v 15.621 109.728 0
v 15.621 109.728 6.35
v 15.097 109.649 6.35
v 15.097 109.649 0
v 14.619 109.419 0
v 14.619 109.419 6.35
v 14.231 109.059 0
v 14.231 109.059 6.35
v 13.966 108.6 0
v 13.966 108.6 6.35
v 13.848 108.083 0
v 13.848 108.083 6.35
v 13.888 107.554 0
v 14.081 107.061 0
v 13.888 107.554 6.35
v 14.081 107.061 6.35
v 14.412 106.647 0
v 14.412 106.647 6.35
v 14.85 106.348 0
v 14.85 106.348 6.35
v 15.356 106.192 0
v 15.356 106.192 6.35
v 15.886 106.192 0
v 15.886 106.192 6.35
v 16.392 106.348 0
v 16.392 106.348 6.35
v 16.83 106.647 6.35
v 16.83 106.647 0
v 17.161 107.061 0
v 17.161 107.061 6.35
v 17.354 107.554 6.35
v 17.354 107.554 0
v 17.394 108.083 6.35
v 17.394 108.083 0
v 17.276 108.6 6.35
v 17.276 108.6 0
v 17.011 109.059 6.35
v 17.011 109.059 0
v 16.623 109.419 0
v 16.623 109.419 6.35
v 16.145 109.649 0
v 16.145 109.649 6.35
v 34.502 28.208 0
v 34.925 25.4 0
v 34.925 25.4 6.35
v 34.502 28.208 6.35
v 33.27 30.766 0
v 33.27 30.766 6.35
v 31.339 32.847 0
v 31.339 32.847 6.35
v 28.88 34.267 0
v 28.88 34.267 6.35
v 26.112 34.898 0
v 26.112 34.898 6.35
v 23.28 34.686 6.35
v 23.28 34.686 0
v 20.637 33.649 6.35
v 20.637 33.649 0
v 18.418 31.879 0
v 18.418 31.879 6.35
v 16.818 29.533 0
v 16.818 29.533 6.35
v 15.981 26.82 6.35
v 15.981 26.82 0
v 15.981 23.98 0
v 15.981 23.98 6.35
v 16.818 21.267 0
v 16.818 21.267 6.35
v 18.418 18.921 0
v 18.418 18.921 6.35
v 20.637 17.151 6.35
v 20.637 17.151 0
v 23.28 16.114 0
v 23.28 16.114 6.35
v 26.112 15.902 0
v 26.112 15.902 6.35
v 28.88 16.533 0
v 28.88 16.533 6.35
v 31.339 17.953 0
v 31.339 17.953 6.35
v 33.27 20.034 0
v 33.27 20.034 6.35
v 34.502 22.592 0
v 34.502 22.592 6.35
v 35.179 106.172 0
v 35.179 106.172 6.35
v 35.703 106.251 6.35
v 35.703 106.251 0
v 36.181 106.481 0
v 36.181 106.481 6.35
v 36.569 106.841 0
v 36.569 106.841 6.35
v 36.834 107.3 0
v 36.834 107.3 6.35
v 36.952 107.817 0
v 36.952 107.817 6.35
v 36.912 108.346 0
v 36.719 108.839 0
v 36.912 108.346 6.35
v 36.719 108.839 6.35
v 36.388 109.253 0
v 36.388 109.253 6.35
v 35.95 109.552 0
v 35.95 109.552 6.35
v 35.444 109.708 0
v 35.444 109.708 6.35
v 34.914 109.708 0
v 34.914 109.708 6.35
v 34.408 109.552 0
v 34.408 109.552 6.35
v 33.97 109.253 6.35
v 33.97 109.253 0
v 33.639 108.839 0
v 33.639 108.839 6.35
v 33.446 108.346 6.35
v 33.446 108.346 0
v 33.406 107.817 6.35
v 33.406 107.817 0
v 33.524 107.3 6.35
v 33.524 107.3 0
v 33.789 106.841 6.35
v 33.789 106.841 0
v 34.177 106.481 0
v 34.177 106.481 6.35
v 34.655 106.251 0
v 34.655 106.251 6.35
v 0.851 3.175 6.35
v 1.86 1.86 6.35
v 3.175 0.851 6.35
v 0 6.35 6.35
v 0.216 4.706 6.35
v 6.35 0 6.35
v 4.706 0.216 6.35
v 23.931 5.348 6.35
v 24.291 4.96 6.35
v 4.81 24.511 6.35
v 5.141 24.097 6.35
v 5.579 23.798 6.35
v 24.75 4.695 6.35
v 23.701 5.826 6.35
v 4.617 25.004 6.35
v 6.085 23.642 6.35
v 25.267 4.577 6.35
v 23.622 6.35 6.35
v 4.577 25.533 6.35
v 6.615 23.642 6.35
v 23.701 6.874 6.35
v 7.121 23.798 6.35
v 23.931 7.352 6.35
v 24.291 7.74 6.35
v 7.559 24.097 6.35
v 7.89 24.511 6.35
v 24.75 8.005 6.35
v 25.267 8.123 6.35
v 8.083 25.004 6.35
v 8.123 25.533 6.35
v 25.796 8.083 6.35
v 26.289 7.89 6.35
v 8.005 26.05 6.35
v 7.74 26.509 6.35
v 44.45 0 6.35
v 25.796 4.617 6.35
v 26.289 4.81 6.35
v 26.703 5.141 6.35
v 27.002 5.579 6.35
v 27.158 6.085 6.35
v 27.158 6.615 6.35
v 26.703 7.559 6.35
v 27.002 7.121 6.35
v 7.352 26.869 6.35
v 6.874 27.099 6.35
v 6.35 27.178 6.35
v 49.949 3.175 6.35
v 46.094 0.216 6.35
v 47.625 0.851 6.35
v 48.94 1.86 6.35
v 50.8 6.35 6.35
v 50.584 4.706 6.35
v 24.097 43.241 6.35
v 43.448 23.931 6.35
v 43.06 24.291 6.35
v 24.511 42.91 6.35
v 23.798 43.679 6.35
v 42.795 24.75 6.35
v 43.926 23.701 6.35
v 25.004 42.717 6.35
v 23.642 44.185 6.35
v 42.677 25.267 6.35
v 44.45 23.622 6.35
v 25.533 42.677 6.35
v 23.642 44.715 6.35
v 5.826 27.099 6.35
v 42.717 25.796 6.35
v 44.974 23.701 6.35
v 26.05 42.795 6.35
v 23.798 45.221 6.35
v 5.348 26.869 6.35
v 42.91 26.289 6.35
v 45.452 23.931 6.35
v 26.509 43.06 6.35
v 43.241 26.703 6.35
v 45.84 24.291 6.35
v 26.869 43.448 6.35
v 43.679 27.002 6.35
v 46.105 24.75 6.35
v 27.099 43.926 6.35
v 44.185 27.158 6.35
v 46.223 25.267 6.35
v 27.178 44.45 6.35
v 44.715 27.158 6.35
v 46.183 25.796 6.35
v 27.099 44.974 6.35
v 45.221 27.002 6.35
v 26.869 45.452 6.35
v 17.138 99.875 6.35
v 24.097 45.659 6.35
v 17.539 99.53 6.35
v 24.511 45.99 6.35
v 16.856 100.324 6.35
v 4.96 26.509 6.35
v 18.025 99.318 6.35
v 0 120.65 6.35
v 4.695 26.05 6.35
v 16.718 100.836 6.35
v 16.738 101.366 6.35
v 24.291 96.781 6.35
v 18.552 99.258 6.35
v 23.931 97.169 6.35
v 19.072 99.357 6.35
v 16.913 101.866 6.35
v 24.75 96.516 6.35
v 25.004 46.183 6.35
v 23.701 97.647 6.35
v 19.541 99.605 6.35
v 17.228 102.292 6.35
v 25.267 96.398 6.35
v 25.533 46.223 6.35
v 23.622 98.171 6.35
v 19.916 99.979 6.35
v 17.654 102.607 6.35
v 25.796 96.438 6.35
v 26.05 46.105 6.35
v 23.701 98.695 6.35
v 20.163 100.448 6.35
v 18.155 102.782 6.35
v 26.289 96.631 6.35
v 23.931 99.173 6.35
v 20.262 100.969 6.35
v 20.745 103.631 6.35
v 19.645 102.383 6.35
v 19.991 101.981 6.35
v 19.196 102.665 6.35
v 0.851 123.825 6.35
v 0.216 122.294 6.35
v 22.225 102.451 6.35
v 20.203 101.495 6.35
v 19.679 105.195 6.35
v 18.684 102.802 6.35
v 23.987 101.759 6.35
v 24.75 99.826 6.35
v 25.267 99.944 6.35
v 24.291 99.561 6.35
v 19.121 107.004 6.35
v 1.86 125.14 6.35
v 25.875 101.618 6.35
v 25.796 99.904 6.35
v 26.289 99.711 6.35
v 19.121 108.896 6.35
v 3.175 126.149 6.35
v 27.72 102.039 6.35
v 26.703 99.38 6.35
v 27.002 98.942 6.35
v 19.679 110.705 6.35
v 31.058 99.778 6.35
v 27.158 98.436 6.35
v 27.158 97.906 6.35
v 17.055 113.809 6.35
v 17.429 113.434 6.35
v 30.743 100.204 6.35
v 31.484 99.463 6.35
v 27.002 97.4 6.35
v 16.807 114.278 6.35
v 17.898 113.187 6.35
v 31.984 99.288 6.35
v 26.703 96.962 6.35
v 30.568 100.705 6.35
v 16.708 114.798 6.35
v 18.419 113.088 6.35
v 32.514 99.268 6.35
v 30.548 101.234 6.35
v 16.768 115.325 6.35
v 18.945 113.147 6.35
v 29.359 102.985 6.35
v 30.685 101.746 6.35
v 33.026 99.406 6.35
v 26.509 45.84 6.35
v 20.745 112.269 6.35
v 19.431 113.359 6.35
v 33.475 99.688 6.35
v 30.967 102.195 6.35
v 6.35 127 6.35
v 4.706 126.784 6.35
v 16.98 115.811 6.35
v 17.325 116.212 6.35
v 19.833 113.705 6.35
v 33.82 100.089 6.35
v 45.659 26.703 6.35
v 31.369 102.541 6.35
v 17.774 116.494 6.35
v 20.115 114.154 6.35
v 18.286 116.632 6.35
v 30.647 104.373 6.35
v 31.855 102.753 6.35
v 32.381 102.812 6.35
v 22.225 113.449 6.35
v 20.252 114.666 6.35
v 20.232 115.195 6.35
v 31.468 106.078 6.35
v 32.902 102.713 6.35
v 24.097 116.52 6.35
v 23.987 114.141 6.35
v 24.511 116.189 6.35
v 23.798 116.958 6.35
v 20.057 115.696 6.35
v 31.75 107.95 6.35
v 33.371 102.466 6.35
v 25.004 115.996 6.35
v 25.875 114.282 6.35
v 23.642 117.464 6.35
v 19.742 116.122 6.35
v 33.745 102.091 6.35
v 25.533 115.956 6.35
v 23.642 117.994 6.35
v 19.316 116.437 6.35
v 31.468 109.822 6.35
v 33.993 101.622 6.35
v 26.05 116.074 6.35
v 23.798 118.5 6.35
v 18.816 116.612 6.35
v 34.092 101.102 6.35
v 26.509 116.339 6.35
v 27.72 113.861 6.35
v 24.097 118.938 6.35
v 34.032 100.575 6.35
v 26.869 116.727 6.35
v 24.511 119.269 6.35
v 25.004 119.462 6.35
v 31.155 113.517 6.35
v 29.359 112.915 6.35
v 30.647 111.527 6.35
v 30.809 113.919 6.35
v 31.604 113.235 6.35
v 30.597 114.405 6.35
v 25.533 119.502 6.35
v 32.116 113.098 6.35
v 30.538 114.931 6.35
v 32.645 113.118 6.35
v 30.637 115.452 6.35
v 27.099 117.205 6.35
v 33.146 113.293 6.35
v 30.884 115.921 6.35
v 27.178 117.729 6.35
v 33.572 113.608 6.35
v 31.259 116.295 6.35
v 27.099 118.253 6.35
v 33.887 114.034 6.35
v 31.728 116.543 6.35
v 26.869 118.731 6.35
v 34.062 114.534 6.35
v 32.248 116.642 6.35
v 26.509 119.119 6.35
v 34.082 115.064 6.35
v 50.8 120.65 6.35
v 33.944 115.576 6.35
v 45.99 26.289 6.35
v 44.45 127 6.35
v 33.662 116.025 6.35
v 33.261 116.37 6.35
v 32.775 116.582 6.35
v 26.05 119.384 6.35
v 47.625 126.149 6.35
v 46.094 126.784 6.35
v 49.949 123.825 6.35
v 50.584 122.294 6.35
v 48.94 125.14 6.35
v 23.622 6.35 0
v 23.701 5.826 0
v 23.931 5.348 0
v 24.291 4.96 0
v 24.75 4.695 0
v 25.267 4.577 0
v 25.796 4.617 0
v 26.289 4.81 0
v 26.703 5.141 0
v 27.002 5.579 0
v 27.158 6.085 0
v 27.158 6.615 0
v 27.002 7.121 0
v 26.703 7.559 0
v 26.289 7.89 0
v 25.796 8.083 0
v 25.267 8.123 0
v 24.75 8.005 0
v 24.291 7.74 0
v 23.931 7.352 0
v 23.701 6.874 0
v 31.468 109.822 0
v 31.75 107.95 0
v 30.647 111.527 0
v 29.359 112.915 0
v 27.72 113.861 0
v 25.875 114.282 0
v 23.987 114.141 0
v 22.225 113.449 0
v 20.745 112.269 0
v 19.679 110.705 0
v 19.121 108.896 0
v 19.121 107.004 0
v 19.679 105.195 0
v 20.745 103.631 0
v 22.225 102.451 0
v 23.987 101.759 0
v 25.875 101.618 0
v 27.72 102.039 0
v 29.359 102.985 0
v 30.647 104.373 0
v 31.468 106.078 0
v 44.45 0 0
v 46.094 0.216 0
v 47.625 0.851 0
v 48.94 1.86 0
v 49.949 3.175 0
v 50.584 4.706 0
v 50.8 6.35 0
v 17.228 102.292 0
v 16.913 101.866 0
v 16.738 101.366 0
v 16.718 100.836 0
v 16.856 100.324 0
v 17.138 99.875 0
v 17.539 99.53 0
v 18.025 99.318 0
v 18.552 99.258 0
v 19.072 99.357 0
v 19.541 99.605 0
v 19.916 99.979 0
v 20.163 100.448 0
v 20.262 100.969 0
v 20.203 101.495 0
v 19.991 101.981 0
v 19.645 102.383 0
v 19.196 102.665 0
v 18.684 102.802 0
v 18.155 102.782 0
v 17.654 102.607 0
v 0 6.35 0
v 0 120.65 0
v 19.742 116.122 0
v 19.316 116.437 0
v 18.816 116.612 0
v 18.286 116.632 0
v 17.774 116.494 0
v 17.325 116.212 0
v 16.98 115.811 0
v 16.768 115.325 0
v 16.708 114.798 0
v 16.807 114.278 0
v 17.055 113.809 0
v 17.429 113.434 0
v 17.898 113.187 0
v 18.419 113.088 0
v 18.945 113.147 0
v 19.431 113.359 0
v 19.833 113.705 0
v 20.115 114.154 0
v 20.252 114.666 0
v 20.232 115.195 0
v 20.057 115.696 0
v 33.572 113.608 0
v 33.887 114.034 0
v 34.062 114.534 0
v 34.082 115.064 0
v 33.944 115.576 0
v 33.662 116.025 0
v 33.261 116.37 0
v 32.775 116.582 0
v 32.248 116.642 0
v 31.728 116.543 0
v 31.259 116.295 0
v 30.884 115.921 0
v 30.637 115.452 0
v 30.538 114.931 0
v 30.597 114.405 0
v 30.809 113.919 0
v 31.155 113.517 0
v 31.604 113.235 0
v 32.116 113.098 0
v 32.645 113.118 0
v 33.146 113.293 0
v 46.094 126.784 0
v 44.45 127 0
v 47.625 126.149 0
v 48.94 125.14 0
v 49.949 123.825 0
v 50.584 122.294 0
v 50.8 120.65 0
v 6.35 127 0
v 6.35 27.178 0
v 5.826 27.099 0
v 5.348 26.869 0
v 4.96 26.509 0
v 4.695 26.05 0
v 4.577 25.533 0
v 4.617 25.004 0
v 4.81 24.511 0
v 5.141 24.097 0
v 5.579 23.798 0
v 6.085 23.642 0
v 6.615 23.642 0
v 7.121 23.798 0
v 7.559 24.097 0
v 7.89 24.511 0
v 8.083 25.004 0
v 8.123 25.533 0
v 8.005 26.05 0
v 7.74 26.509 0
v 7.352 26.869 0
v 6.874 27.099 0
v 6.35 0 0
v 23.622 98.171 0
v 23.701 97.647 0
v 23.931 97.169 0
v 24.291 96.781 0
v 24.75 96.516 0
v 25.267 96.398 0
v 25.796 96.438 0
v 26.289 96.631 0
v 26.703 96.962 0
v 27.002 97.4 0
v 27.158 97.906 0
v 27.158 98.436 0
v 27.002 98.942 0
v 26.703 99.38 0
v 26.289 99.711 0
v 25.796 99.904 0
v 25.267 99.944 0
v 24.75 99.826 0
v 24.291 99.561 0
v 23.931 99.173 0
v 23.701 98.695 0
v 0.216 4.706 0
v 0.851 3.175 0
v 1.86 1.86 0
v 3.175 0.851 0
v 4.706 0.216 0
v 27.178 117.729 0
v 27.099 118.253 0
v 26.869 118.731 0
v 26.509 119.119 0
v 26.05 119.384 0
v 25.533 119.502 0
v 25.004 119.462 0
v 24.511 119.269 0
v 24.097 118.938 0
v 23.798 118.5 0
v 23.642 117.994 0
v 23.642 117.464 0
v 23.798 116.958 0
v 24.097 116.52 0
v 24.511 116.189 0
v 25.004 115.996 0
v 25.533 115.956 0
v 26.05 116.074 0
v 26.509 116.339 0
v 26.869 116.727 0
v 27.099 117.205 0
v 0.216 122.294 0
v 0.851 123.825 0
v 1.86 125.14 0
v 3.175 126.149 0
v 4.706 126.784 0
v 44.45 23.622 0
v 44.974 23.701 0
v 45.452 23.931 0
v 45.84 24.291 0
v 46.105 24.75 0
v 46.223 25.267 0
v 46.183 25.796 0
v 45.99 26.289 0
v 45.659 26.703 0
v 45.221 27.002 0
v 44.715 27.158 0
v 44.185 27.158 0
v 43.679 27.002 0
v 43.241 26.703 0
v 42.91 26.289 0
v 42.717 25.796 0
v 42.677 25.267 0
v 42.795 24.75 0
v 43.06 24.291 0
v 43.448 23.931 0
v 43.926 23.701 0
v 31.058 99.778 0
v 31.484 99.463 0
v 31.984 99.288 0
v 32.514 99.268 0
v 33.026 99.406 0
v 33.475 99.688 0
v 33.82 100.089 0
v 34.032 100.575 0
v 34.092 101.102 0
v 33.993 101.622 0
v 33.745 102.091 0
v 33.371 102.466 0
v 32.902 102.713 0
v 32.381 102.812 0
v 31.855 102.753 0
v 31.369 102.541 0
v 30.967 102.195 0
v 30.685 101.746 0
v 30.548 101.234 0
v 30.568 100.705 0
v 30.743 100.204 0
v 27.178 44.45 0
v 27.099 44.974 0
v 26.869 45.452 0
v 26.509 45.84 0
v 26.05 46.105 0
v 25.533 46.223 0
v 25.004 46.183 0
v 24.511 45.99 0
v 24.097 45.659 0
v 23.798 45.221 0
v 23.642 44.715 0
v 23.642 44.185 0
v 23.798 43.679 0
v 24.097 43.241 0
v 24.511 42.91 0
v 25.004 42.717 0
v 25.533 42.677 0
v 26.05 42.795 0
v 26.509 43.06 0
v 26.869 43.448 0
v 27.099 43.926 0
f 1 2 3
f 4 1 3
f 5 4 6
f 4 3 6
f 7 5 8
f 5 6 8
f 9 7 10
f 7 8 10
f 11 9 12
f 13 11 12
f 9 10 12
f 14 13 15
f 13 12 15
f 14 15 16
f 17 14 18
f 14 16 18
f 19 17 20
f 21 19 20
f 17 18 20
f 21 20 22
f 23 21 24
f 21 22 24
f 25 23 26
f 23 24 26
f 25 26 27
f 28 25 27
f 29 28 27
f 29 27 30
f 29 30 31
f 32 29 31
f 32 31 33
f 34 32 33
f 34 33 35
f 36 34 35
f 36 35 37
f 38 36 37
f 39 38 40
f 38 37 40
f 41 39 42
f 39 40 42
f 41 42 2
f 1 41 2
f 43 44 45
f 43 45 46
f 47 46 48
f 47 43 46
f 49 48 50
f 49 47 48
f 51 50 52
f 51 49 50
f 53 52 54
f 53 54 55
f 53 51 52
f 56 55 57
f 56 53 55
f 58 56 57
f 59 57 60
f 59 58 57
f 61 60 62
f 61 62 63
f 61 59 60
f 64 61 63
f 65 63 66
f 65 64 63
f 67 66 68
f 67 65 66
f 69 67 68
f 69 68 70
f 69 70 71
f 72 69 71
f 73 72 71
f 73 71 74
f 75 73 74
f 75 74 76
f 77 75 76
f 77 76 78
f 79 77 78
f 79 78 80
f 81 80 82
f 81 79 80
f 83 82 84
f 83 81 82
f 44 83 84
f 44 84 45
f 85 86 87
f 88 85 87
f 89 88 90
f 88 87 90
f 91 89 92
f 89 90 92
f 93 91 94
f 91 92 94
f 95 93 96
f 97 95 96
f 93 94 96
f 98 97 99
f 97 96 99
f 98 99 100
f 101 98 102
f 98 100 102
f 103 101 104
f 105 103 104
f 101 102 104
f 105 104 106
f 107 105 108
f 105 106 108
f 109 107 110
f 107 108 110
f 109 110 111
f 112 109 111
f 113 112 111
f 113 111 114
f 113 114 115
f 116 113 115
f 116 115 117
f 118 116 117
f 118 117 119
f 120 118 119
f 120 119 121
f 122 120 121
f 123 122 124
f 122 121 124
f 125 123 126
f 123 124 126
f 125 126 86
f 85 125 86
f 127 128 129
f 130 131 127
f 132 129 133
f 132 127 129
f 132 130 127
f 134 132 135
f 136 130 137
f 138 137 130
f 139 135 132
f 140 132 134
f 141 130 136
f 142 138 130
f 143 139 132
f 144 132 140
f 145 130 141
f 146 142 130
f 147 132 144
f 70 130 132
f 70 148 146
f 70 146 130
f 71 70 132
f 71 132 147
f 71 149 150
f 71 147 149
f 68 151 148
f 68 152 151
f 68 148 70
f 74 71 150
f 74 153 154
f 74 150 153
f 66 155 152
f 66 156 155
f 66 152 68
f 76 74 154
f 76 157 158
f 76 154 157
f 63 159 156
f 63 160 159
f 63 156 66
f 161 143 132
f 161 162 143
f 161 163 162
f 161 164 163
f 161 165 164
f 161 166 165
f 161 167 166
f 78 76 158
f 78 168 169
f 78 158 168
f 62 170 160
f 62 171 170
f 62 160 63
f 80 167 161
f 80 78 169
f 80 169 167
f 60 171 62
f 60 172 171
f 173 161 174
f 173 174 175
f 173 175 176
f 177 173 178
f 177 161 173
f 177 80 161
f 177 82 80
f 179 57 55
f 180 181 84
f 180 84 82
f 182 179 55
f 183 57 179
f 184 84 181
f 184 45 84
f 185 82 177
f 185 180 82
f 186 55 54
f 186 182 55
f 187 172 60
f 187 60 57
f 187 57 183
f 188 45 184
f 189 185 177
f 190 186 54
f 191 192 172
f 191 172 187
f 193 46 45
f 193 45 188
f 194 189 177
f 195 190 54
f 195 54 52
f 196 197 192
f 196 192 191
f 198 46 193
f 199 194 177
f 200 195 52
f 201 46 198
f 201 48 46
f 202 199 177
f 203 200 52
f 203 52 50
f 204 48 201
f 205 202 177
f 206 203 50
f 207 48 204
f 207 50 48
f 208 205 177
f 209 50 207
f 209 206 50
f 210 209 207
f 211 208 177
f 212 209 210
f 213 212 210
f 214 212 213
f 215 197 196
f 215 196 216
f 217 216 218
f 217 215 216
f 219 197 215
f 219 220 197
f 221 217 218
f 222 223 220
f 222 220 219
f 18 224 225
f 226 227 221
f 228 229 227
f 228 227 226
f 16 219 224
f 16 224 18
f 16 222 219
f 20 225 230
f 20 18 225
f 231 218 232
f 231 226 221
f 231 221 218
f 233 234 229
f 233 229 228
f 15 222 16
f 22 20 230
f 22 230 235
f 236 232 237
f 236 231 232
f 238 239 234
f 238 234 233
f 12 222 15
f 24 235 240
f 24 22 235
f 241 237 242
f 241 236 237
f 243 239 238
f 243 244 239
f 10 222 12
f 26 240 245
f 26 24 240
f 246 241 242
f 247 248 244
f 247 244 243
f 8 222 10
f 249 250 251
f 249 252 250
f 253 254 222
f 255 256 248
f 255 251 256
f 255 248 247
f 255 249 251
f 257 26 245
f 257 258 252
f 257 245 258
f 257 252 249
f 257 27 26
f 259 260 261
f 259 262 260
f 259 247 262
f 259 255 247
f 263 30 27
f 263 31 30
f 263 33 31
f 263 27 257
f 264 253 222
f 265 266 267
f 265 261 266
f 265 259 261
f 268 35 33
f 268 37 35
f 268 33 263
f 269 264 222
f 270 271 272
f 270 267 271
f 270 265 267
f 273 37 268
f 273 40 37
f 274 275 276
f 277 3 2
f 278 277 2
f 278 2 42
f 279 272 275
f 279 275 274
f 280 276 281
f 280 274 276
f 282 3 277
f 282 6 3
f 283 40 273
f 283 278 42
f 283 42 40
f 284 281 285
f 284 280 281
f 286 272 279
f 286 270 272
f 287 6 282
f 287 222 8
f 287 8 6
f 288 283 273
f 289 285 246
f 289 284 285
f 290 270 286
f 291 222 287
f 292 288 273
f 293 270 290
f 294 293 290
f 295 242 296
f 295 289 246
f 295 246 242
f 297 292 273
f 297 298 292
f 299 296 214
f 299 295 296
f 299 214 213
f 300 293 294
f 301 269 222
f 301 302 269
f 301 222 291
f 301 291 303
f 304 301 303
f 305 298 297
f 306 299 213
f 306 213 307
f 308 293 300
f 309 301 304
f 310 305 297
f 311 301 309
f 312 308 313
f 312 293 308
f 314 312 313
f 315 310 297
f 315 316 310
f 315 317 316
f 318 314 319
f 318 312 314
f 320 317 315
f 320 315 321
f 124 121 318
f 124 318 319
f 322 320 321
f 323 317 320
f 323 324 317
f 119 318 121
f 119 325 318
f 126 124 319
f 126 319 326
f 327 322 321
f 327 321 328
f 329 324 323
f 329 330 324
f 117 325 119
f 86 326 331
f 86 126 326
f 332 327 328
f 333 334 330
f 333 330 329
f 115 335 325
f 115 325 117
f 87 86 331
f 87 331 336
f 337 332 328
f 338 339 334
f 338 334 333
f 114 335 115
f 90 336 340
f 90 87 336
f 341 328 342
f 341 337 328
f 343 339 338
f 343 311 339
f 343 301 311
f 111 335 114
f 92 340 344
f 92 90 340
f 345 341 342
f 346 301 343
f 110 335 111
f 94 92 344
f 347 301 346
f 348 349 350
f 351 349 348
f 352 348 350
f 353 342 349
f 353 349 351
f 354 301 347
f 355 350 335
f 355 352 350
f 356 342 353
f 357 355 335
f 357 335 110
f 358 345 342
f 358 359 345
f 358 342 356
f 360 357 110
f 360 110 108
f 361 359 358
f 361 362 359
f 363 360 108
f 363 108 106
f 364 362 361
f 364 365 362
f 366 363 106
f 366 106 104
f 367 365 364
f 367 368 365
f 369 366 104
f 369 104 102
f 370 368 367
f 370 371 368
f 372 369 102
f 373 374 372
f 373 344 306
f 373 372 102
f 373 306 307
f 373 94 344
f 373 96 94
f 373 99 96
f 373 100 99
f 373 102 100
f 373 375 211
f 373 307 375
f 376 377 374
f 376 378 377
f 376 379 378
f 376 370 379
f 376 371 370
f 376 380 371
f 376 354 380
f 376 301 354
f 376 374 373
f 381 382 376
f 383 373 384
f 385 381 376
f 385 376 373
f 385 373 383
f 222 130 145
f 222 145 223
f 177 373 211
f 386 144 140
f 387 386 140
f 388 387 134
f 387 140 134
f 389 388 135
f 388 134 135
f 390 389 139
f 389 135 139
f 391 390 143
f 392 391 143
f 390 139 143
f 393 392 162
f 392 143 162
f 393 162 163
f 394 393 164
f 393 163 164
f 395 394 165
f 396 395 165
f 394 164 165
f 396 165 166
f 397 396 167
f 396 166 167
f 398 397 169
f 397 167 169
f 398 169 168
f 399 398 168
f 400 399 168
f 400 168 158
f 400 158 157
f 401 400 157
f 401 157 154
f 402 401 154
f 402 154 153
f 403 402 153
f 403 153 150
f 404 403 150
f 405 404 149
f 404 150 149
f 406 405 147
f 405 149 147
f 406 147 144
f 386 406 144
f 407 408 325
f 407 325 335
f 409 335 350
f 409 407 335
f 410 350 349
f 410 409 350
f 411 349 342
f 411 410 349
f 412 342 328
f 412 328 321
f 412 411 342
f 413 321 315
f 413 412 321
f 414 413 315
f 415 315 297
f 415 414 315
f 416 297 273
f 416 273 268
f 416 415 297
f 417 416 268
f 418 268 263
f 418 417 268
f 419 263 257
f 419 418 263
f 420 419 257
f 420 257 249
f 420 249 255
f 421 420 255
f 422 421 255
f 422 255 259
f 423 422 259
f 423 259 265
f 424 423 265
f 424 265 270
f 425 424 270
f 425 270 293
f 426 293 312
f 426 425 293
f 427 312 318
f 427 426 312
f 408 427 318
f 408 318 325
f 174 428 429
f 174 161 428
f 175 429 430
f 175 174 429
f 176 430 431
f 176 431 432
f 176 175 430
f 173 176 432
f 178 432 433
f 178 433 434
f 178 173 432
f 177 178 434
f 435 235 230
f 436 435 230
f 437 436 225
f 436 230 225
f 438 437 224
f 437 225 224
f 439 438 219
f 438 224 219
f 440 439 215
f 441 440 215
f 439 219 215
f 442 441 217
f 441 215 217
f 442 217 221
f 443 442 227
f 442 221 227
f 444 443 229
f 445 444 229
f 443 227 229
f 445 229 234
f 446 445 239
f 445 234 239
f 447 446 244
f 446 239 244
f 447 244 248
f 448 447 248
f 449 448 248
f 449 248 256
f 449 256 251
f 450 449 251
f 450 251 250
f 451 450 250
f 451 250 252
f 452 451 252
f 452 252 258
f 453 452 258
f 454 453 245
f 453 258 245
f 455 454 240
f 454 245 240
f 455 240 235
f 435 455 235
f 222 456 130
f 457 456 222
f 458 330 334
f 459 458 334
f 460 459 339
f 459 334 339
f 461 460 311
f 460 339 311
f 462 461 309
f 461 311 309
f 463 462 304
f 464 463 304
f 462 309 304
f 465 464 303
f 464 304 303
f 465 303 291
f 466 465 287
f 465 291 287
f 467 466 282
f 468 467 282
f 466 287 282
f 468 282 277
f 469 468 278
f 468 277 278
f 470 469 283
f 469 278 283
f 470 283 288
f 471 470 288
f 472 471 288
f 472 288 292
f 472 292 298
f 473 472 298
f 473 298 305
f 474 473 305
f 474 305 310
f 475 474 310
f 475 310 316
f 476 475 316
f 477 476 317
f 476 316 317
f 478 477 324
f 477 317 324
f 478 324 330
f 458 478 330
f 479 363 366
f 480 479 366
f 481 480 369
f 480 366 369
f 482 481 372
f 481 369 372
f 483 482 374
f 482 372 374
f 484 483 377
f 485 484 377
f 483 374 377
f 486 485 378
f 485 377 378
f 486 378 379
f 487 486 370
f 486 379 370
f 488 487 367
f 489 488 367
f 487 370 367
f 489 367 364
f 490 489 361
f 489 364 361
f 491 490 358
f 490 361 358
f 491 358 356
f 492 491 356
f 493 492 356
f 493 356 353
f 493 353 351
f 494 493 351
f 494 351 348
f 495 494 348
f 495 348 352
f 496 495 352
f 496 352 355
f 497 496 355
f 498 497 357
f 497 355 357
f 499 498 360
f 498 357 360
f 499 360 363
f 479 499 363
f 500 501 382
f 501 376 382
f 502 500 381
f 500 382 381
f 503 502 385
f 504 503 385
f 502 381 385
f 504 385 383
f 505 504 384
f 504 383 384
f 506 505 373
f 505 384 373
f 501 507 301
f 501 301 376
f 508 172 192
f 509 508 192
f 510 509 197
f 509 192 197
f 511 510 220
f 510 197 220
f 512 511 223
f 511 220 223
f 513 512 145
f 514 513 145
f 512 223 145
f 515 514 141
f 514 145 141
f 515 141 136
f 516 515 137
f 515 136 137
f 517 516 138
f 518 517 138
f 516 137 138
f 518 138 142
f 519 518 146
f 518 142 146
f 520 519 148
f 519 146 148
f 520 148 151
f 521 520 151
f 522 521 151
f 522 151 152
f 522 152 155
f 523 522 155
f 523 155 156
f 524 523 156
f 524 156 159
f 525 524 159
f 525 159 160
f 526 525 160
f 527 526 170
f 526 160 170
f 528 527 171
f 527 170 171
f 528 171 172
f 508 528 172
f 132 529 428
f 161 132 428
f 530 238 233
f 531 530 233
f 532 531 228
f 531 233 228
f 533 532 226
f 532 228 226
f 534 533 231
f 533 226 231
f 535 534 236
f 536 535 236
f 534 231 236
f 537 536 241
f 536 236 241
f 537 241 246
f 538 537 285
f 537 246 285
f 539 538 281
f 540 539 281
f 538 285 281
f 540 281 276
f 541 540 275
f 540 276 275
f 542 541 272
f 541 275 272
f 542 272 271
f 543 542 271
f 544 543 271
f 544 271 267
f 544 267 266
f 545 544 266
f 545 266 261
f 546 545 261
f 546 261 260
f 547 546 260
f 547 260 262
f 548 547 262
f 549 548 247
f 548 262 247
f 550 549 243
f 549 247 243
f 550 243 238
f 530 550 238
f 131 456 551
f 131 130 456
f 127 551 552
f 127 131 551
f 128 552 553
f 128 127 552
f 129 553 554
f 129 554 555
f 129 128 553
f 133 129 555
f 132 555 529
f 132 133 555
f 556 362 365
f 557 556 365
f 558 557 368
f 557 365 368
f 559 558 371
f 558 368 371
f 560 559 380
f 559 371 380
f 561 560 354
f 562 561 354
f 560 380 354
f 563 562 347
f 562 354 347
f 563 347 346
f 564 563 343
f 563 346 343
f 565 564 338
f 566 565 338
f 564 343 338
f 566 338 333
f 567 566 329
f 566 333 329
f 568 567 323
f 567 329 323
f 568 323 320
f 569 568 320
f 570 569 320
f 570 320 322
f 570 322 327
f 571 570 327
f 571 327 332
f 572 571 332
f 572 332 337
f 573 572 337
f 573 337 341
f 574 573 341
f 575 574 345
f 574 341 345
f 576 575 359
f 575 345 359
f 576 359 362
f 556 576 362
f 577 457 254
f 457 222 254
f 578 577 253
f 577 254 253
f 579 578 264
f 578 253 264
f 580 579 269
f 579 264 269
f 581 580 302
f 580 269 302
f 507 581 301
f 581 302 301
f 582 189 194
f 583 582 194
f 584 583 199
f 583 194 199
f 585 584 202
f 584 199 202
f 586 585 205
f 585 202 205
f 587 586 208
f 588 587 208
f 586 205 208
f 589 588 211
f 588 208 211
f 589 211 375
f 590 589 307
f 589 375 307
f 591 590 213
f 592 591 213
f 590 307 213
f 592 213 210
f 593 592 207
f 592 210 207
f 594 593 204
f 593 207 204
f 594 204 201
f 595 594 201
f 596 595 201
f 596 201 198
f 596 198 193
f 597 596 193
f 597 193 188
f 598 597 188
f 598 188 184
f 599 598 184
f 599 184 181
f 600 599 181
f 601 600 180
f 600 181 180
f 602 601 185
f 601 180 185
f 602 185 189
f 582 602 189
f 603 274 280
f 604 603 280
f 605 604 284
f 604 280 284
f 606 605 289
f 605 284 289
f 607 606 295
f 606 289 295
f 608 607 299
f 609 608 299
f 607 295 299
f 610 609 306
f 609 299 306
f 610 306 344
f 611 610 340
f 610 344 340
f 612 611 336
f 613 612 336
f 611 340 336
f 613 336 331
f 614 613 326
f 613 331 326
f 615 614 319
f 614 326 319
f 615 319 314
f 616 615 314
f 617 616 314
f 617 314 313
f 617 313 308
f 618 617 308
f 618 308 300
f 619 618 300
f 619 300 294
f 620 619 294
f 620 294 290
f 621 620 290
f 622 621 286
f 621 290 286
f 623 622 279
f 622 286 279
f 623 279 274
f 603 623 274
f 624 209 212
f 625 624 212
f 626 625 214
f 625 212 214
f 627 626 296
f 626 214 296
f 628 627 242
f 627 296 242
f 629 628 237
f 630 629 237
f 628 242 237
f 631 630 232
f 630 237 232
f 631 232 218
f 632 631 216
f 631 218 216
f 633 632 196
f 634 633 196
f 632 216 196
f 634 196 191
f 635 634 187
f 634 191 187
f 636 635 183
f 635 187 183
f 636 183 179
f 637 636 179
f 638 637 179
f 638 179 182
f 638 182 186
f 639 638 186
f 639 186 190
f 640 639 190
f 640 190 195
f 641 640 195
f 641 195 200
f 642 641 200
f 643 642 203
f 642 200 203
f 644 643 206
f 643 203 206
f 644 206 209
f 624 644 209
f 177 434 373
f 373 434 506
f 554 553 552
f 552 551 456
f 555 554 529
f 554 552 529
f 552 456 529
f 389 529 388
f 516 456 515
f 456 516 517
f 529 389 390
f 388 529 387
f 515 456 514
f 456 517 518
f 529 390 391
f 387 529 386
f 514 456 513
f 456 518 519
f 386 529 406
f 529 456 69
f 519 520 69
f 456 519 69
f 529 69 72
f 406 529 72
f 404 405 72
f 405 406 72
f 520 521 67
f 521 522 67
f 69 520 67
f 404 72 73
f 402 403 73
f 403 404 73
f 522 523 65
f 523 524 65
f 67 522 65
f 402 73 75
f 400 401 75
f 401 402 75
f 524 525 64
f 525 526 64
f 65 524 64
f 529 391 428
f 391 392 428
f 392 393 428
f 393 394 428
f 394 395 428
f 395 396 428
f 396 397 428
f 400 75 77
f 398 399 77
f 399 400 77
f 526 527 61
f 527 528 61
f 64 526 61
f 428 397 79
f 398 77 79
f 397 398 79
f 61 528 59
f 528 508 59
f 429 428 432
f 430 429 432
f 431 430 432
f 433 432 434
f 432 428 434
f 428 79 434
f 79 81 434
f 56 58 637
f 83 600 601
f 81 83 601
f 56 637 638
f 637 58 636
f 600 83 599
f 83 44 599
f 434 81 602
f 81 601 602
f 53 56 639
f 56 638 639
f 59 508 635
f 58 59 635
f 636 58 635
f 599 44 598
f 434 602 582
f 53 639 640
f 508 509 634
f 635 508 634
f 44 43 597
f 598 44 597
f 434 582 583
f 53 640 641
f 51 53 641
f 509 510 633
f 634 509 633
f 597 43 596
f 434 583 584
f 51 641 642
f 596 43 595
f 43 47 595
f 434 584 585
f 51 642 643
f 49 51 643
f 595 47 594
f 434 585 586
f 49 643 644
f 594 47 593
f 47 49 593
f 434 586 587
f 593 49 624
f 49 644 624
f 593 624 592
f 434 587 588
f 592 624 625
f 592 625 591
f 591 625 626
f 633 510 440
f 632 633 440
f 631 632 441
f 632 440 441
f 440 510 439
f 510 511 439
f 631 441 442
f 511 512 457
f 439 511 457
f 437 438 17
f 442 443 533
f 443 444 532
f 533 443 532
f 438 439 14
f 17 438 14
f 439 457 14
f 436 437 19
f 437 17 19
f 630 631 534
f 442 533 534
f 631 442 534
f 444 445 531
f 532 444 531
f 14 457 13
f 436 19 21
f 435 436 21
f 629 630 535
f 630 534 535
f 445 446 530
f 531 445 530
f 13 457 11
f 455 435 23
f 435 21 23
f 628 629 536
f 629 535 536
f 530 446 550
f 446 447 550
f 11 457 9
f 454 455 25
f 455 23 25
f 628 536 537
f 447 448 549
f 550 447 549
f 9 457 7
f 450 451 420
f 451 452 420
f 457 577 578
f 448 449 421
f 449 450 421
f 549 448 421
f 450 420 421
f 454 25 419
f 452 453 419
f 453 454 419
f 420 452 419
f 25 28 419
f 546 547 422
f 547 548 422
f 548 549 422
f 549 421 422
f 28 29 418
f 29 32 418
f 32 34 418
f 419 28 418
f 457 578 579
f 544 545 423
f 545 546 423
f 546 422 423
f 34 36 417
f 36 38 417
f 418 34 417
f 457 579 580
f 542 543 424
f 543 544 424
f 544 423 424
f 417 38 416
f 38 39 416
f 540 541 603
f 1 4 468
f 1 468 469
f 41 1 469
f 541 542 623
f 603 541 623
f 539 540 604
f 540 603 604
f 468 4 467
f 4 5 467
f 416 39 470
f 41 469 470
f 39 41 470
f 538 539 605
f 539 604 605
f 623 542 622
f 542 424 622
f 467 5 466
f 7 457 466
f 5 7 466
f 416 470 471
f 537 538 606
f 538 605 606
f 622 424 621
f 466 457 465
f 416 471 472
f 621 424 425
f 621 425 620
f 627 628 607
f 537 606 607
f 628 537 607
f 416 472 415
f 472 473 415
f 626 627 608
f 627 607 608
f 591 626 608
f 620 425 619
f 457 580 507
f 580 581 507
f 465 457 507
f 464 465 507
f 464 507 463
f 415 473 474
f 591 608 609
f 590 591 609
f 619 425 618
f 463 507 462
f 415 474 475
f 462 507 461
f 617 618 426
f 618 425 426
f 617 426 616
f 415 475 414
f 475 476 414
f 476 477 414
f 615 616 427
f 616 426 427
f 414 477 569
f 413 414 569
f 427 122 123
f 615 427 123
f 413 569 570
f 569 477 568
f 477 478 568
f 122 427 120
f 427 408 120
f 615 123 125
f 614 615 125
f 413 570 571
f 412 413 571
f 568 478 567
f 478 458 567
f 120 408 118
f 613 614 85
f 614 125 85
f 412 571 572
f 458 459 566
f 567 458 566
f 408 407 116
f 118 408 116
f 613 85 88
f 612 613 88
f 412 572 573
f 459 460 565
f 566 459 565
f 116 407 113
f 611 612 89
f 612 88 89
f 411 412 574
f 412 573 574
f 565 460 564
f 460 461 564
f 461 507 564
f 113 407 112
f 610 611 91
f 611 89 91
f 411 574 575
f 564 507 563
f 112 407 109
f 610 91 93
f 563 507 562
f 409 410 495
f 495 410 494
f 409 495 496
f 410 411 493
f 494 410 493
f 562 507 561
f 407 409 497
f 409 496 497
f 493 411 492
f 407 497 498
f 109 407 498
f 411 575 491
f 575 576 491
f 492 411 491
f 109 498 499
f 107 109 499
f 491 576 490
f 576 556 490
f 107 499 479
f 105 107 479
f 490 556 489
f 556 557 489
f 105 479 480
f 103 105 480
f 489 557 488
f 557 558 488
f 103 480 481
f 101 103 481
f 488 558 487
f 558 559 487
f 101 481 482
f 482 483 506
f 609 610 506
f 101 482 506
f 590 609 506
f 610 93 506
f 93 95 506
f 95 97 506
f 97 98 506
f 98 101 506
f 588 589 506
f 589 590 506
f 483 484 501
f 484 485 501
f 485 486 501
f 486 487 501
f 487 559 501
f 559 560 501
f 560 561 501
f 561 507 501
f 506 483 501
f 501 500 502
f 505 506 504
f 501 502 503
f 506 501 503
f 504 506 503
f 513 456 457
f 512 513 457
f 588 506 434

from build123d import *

# Parameters (mm, degrees)
SKETCH1_W           = 50.8
SKETCH1_H           = 127
SKETCH1_R           = 9.525
SKETCH1_R_2         = 6.35
BOSS_EXTRUDE1_DEPTH = 6.35
SKETCH2_R           = 1.778
CUT_EXTRUDE1_DEPTH  = 6.35
CIRPATTERN1_COUNT   = 4
SKETCH3_R           = 1.778
CUT_EXTRUDE2_DEPTH  = 6.35
CIRPATTERN2_COUNT   = 8
FILLET1_R           = 6.35


with BuildPart() as part:
    # Sketch1 → Boss-Extrude1 (new body)
    with BuildSketch(Plane.XY):
        with Locations((25.4, 63.5)):
            Rectangle(SKETCH1_W, SKETCH1_H)
        with Locations((25.4, 25.4)):
            Circle(SKETCH1_R, mode=Mode.SUBTRACT)
        with Locations((25.4, 107.95)):
            Circle(SKETCH1_R_2, mode=Mode.SUBTRACT)
    extrude(amount=BOSS_EXTRUDE1_DEPTH)

    # Sketch2 → Cut-Extrude1 (cut)
    with BuildSketch(Plane.XY.offset(6.35)):
        with Locations((25.4, 44.45)):
            Circle(SKETCH2_R)
    cut_extrude1 = extrude(amount=-CUT_EXTRUDE1_DEPTH, mode=Mode.SUBTRACT)

    # CirPattern1: Cut-Extrude1 ×4 about axis
    cirpattern1_axis = Axis((25.4, 25.4, 0), (0, 0, 1))
    for i in range(1, CIRPATTERN1_COUNT):
        add(cut_extrude1.rotate(cirpattern1_axis, i * 360 / CIRPATTERN1_COUNT), mode=Mode.SUBTRACT)

    # Sketch3 → Cut-Extrude2 (cut)
    with BuildSketch(Plane.XY.offset(6.35)):
        with Locations((25.4, 117.729)):
            Circle(SKETCH3_R)
    cut_extrude2 = extrude(amount=-CUT_EXTRUDE2_DEPTH, mode=Mode.SUBTRACT)

    # CirPattern2: Cut-Extrude2 ×8 about axis
    cirpattern2_axis = Axis((25.4, 107.95, 0), (0, 0, 1))
    for i in range(1, CIRPATTERN2_COUNT):
        add(cut_extrude2.rotate(cirpattern2_axis, i * 360 / CIRPATTERN2_COUNT), mode=Mode.SUBTRACT)

    # Fillet1
    fillet1_edges = [part.edges().sort_by_distance(p)[0] for p in [
        (0, 127, 3.175),
        (50.8, 127, 3.175),
        (50.8, 0, 3.175),
        (0, 0, 3.175),
    ]]
    fillet(fillet1_edges, radius=FILLET1_R)


solid = part.part
